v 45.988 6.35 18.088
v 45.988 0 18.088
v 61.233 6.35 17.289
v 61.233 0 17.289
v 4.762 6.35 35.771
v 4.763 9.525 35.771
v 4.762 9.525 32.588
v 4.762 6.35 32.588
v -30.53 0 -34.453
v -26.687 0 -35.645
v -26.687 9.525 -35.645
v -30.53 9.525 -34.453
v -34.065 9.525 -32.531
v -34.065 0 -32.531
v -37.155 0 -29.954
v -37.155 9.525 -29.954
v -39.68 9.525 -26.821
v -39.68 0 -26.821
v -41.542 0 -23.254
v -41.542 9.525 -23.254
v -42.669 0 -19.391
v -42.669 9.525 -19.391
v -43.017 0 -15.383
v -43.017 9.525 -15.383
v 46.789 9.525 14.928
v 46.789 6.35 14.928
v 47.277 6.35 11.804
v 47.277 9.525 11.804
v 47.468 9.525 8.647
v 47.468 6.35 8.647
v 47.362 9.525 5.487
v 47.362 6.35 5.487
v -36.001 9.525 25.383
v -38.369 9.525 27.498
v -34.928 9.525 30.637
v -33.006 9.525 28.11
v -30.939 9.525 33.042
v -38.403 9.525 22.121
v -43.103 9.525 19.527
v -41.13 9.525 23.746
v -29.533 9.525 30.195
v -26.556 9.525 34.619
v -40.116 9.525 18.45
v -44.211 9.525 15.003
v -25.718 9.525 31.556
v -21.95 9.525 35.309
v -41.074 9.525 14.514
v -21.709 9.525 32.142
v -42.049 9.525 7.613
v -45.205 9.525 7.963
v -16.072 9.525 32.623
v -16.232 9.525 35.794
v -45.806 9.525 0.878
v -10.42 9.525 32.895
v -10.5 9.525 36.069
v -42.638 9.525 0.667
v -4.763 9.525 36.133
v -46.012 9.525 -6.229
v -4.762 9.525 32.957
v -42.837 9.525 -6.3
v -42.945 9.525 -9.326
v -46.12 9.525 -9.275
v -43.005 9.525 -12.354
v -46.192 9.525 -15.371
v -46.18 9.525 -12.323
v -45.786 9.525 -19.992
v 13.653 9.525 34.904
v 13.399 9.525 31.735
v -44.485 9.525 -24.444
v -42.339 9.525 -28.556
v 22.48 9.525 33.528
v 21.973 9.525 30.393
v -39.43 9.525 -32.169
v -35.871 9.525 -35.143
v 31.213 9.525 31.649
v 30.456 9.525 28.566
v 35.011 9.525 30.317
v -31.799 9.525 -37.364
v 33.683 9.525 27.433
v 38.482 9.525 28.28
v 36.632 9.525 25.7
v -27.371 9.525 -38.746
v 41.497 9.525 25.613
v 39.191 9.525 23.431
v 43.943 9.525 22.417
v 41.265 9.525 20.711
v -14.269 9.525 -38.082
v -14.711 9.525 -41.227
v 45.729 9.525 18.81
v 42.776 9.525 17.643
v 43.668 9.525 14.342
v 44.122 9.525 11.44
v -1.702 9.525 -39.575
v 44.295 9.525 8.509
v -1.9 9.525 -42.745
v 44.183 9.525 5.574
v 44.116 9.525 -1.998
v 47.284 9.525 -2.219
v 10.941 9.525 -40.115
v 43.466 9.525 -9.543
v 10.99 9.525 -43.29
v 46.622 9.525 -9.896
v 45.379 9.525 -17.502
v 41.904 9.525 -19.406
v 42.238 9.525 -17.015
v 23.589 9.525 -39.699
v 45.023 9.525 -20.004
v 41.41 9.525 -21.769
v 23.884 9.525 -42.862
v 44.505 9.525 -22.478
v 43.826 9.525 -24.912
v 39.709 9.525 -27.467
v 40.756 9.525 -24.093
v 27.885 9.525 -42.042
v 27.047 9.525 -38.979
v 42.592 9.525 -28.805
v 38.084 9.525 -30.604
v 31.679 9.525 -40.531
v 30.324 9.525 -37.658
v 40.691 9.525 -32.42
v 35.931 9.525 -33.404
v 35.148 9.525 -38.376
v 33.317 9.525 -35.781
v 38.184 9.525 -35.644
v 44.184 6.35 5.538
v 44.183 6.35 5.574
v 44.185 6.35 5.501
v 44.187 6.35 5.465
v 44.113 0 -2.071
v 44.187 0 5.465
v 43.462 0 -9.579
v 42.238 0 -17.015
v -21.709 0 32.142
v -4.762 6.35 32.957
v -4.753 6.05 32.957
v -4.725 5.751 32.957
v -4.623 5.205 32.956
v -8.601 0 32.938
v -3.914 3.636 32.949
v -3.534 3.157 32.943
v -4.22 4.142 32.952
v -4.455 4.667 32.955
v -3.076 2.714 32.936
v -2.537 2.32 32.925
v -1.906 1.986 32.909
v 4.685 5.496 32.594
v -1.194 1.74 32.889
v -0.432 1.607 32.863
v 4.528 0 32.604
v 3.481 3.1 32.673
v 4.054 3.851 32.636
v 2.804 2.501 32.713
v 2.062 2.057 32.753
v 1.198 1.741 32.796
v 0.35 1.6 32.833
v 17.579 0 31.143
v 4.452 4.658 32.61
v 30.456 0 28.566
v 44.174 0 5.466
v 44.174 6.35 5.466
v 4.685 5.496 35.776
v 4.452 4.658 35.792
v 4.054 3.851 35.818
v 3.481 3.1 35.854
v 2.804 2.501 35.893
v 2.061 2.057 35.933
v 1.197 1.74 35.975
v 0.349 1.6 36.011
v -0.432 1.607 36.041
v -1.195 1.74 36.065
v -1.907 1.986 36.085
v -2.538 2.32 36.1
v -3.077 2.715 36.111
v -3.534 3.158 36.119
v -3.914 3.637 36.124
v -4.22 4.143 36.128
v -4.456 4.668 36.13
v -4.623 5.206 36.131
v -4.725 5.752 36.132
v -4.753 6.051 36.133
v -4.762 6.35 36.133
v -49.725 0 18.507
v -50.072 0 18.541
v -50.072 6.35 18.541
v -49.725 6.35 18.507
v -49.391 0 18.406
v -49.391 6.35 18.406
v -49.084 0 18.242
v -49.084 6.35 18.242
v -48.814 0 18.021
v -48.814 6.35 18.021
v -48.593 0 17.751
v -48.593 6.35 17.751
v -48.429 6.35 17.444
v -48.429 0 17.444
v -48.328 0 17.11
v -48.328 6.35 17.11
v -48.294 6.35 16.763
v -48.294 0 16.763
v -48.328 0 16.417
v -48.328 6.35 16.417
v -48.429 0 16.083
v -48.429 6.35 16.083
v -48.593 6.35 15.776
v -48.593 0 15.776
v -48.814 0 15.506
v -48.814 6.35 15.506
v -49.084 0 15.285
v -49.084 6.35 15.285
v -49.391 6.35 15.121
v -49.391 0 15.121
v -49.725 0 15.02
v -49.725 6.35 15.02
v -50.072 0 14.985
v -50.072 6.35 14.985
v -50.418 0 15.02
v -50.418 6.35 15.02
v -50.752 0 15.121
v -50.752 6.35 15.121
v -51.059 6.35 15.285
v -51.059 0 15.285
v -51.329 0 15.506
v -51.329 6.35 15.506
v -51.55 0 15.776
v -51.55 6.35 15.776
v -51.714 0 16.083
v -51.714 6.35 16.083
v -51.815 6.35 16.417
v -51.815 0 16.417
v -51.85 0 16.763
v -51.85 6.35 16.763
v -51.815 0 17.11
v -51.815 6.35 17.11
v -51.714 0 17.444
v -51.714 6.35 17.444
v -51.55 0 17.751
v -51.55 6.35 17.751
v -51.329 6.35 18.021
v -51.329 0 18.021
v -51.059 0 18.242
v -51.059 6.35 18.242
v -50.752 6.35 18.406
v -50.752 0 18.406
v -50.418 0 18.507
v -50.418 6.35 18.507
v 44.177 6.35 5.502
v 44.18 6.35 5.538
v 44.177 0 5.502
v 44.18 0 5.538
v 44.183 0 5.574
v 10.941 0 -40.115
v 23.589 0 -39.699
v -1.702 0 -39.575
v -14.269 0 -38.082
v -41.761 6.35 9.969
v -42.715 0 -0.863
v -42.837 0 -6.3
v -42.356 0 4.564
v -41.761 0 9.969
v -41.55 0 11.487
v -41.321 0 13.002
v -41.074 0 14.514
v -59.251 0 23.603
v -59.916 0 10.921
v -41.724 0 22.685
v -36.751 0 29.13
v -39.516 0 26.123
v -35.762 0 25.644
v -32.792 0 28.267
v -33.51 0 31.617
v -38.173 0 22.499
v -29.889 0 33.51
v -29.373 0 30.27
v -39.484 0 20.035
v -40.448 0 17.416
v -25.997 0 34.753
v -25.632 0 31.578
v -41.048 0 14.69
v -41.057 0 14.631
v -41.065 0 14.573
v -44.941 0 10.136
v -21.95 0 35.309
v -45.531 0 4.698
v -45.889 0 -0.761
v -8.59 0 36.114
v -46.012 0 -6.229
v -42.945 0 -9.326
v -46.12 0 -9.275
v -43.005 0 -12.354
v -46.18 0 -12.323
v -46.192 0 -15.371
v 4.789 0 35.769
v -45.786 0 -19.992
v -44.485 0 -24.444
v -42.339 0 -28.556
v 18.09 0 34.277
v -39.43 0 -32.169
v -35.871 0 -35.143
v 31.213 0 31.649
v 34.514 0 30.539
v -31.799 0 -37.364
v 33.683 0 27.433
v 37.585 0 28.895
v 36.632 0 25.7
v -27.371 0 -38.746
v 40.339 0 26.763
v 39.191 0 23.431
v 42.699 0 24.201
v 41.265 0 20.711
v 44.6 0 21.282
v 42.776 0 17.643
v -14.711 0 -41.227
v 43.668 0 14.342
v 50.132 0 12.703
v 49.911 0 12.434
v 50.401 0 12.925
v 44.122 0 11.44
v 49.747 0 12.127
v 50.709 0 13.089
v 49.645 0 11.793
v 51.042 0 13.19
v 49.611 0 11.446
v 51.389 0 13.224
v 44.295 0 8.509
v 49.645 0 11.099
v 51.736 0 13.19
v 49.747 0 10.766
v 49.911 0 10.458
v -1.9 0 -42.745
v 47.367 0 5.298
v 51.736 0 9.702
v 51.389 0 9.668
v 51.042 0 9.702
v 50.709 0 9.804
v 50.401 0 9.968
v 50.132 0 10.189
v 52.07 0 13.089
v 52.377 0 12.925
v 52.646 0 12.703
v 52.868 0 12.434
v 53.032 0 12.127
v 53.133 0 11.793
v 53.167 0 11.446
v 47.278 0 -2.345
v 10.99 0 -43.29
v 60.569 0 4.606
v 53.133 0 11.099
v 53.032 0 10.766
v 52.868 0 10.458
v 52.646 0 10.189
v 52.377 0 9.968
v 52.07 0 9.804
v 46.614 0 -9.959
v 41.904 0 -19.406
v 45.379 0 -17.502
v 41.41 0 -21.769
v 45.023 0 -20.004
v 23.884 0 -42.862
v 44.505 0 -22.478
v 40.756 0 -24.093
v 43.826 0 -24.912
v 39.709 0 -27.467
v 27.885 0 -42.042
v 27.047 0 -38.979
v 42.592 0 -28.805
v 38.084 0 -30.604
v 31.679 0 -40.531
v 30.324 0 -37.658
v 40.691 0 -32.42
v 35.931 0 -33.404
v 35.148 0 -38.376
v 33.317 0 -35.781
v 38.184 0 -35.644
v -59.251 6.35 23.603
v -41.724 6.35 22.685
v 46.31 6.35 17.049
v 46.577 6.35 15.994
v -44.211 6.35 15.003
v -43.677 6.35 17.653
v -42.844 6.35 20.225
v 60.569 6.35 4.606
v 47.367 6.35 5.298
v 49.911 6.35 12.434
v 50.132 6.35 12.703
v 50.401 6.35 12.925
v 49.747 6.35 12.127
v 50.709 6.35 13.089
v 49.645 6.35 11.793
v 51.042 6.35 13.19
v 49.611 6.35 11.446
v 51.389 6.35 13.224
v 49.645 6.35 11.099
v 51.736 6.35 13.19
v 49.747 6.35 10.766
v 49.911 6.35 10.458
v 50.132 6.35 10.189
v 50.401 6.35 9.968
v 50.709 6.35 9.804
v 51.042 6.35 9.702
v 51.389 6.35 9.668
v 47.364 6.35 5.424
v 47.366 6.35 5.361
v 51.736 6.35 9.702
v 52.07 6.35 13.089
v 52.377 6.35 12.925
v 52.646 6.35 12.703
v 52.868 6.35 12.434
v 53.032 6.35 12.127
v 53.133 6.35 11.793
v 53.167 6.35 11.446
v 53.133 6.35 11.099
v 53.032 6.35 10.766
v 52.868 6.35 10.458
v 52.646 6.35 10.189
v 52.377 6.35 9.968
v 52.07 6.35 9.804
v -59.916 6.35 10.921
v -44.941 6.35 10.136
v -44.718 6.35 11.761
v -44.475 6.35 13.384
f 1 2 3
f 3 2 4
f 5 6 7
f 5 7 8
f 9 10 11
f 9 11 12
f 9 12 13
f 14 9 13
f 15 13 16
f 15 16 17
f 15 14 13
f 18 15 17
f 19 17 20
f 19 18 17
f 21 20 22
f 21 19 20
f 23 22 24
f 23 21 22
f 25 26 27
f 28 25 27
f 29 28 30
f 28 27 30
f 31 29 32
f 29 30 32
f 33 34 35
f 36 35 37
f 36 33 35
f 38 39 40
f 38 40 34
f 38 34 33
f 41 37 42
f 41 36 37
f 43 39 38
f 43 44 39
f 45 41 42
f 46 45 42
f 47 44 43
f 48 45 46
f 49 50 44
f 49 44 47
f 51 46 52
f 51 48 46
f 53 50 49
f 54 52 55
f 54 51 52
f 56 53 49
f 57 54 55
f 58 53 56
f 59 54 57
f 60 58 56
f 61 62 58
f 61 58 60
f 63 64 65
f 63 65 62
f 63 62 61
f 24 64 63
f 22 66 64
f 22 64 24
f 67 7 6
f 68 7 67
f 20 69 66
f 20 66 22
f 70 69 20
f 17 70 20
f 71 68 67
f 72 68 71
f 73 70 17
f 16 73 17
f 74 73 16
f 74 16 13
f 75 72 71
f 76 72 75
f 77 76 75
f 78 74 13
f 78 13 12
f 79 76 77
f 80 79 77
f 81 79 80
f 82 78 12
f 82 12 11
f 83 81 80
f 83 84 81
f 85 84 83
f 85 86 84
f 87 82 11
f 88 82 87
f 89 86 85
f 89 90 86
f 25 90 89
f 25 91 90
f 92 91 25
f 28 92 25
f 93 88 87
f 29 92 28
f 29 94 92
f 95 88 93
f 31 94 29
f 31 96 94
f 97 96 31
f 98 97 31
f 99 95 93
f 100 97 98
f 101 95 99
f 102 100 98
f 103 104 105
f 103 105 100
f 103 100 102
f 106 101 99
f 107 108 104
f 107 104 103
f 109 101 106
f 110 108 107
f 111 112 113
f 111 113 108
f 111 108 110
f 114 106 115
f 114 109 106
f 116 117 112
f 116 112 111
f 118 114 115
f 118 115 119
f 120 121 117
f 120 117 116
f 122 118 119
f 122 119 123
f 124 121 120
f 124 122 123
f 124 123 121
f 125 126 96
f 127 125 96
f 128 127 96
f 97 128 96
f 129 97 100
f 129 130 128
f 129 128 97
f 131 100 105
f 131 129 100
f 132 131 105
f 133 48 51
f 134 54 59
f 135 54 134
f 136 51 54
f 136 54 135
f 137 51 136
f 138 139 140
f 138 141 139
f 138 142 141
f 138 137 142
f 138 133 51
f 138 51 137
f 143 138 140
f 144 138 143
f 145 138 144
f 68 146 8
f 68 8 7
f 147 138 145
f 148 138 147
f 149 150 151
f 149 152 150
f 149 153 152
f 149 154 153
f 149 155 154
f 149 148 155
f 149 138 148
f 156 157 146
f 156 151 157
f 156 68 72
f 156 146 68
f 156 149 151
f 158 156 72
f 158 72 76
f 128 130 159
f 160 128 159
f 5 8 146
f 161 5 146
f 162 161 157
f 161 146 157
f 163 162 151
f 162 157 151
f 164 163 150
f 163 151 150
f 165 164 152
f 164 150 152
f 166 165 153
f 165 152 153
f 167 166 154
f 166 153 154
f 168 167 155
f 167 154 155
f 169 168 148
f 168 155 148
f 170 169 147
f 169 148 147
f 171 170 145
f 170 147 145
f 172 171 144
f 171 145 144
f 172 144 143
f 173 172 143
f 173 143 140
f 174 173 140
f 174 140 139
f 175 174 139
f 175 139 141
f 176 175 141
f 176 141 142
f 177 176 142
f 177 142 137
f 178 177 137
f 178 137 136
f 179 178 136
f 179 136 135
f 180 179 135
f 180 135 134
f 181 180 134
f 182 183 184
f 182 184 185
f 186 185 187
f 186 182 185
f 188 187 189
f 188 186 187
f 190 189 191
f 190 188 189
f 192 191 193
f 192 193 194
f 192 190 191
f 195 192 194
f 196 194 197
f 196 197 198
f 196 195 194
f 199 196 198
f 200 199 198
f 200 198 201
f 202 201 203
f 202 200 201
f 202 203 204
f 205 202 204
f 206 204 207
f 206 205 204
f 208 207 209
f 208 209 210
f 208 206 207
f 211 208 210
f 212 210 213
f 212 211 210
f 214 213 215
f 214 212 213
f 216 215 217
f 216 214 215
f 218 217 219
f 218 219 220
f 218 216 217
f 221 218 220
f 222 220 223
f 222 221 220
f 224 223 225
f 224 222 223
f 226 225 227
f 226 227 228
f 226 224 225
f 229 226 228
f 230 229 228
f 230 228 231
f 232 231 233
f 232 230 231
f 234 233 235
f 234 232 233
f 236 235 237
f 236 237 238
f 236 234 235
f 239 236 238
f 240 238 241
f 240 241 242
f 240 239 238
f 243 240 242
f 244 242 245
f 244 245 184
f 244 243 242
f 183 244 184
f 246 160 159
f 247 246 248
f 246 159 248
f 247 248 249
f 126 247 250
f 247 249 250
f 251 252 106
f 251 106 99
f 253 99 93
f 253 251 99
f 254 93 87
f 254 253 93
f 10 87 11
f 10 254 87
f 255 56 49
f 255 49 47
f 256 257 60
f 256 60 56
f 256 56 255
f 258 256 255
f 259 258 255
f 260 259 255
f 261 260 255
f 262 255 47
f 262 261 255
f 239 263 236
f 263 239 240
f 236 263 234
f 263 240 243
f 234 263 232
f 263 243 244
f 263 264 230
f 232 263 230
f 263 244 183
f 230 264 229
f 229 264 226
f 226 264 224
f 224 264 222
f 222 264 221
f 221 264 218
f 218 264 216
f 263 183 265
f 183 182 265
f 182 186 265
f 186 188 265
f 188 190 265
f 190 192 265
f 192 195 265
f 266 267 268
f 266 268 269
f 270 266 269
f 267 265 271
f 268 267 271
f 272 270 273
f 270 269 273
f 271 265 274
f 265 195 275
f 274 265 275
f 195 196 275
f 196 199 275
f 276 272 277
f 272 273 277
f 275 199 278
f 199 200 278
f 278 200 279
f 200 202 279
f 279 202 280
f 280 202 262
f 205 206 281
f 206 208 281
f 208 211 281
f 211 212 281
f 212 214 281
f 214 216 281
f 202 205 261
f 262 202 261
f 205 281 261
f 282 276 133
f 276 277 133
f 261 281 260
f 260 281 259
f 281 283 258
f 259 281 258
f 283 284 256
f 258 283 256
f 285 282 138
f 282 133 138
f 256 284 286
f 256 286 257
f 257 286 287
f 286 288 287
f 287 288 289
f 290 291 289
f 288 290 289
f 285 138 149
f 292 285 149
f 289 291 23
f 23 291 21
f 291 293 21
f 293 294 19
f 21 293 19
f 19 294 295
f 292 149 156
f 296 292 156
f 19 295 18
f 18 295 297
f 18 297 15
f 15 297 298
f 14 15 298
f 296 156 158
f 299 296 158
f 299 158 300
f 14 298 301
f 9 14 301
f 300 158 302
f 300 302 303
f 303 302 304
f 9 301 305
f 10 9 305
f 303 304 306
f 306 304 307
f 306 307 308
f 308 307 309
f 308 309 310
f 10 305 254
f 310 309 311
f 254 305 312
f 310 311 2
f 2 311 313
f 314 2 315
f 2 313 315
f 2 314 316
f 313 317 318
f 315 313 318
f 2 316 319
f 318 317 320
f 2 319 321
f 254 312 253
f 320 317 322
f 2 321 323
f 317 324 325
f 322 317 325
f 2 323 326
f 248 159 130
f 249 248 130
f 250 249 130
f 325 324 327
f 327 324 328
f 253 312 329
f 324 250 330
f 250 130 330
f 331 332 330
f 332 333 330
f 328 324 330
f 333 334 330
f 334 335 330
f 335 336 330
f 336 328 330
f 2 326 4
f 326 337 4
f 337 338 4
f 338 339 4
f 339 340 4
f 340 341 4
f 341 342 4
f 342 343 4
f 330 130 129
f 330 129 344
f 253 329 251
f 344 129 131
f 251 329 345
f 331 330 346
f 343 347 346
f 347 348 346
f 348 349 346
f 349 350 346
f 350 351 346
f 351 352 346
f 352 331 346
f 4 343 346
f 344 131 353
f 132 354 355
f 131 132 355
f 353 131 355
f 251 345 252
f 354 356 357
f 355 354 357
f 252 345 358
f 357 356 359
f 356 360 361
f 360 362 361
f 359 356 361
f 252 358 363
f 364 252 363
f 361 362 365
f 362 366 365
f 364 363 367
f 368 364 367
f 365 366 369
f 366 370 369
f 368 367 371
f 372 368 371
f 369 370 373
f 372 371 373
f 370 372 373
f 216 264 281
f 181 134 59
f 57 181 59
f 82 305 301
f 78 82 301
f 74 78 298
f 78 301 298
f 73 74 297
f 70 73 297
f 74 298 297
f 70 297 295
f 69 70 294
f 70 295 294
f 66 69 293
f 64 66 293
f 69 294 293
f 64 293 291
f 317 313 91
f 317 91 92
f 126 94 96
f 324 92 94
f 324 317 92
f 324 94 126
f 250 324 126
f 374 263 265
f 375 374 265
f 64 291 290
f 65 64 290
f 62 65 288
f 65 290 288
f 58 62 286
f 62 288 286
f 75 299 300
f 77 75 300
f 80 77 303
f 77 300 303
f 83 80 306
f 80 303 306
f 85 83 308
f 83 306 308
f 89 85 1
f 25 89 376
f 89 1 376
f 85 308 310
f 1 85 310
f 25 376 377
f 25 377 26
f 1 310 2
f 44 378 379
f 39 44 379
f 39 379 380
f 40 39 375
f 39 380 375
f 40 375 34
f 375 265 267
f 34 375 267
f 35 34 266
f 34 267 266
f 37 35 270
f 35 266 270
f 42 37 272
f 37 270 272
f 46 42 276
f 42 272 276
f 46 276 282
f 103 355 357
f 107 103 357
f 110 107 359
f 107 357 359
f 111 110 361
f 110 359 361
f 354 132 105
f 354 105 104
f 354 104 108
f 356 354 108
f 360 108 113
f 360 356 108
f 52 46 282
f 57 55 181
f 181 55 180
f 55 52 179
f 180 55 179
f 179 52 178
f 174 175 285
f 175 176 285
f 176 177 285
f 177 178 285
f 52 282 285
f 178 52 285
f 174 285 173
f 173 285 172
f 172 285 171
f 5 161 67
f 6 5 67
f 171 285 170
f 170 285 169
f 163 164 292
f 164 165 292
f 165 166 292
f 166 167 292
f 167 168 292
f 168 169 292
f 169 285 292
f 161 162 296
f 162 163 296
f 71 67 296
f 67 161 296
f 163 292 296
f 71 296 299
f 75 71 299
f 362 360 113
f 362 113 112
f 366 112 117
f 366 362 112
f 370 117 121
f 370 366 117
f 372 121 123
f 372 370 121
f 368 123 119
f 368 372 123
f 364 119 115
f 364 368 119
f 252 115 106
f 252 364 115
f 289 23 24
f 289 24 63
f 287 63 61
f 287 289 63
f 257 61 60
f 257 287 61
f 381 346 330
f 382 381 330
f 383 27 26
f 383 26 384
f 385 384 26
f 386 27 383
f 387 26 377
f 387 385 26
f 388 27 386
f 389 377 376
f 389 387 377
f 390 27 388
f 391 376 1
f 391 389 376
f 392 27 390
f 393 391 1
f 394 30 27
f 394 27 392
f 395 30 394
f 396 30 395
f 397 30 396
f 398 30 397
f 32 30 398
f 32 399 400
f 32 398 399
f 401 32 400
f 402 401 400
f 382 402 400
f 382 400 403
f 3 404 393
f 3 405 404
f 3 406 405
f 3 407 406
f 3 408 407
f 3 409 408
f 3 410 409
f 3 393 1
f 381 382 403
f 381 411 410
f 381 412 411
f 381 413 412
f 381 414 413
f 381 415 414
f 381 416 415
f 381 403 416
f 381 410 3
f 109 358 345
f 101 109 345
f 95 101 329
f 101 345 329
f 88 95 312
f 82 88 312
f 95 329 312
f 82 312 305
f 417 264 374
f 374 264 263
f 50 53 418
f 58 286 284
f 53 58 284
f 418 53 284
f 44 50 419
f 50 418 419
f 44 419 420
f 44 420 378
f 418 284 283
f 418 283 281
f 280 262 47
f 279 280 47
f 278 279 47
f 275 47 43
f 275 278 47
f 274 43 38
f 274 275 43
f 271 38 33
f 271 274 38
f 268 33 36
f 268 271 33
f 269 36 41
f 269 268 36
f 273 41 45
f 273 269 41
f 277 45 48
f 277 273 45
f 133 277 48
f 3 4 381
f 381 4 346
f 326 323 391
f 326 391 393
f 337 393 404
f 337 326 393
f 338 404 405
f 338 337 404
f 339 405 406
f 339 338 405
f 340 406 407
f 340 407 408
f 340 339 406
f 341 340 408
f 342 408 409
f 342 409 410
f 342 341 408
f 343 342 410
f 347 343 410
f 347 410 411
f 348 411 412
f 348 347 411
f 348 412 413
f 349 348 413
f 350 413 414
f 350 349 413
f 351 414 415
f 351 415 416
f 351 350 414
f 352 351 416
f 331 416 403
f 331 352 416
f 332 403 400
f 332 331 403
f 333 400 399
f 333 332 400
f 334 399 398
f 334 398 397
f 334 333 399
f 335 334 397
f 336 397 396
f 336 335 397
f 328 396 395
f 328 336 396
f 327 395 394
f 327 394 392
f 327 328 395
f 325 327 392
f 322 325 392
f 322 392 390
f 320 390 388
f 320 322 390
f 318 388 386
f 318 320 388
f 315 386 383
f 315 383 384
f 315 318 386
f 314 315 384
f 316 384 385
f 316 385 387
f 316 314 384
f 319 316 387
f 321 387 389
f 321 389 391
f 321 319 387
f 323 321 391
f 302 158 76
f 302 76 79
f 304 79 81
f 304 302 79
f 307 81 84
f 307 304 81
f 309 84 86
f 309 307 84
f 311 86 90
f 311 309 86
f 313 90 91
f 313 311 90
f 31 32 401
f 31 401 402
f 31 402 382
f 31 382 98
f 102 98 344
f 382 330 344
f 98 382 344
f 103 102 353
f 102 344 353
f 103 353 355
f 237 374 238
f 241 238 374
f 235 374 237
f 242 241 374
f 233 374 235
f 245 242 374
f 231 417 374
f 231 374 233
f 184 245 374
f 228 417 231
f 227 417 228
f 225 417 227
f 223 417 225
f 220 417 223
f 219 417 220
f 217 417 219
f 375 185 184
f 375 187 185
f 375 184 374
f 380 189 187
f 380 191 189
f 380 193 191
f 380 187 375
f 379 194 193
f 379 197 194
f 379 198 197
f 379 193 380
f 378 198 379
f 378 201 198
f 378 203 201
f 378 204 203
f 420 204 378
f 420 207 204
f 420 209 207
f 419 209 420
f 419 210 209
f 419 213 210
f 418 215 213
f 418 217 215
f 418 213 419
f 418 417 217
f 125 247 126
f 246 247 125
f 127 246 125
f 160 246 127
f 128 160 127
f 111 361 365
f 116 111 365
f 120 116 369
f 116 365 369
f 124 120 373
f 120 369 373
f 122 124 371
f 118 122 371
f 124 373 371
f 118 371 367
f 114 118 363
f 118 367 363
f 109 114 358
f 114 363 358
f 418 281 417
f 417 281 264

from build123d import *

# Parameters (mm, degrees)
BOSS_EXTRUDE1_DEPTH = 9.525
SKETCH3_R           = 1.778
BOSS_EXTRUDE2_DEPTH = 6.35
CUT_EXTRUDE1_DEPTH  = 62.992


with BuildPart() as part:
    # Sketch2 → Boss-Extrude1 (new body)
    with BuildSketch(Plane(origin=(0, 0, 0), x_dir=(1, 0, 0), z_dir=(0, 1, 0))):
        with BuildLine():
            ThreePointArc((-27.371275132, 38.745818095), (-40.973617499, 30.433742494), (-46.191603644, 15.370975839))
            ThreePointArc((-46.191603644, 15.370975839), (-46.156170212, 10.799100226), (-46.01239655, 6.229348451))
            ThreePointArc((-46.01239655, 6.229348451), (-45.554867394, -4.424369785), (-44.211253726, -15.00292108))
            ThreePointArc((-44.211253726, -15.00292108), (-36.72609395, -29.152486681), (-21.949825784, -35.308761743))
            ThreePointArc((-21.949825784, -35.308761743), (4.789142288, -35.769006094), (31.212812312, -31.649066671))
            ThreePointArc((31.212812312, -31.649066671), (41.496738573, -25.613366213), (46.788564963, -14.927609673))
            ThreePointArc((46.788564963, -14.927609673), (47.409631974, -10.227797309), (47.362149343, -5.487364219))
            ThreePointArc((47.362149343, -5.487364219), (47.025821725, 6.063769752), (45.378811544, 17.501827706))
            ThreePointArc((45.378811544, 17.501827706), (44.784036993, 21.245111147), (43.826445822, 24.912391724))
            ThreePointArc((43.826445822, 24.912391724), (36.726457071, 37.077263766), (23.883695238, 42.861502743))
            ThreePointArc((23.883695238, 42.861502743), (-1.899636761, 42.744509754), (-27.371275132, 38.745818095))
        make_face()
        with BuildLine():
            ThreePointArc((-26.686729853, 35.645166459), (-38.494719431, 28.449859817), (-43.016527849, 15.382560778))
            ThreePointArc((-43.016527849, 15.382560778), (-42.981363707, 10.840148441), (-42.837461763, 6.299879882))
            ThreePointArc((-42.837461763, 6.299879882), (-42.392238342, -4.14410464), (-41.073809227, -14.514098915))
            ThreePointArc((-41.073809227, -14.514098915), (-34.571127727, -26.820697593), (-21.709378759, -32.141660966))
            ThreePointArc((-21.709378759, -32.141660966), (4.527721192, -32.604481914), (30.456209617, -28.565533412))
            ThreePointArc((30.456209617, -28.565533412), (39.190718322, -23.430787451), (43.667641206, -14.341539963))
            ThreePointArc((43.667641206, -14.341539963), (44.243978017, -9.976676032), (44.183339256, -5.574344354))
            ThreePointArc((44.183339256, -5.574344354), (43.863792824, 5.776703787), (42.237767725, 17.015228877))
            ThreePointArc((42.237767725, 17.015228877), (41.676987361, 20.591755151), (40.755667539, 24.092781371))
            ThreePointArc((40.755667539, 24.092781371), (34.67633853, 34.650507535), (23.588863748, 39.699440682))
            ThreePointArc((23.588863748, 39.699440682), (-1.702378082, 39.575120085), (-26.686729853, 35.645166459))
        make_face(mode=Mode.SUBTRACT)
    extrude(amount=BOSS_EXTRUDE1_DEPTH)

    # Sketch3 → Boss-Extrude2 (add)
    # profile 1 of 2: a face of its own
    with BuildSketch(Plane(origin=(0, 0, 0), x_dir=(1, 0, 0), z_dir=(0, 1, 0))):
        with BuildLine():
            ThreePointArc((43.667641206, -14.341539963), (43.210882804, -16.338608318), (42.526004307, -18.269372853))
            Line((42.526004307, -18.269372853), (61.233464192, -17.288956425))
            Line((61.233464192, -17.288956425), (60.568797548, -4.606361333))
            Line((60.568797548, -4.606361333), (44.173733451, -5.465590234))
            ThreePointArc((44.173733451, -5.465590234), (44.247134499, -9.922178586), (43.667641206, -14.341539963))
        make_face()
        with Locations(Location((51.389184551, -11.446158862, 0), (0, 0, 270))):
            Circle(SKETCH3_R, mode=Mode.SUBTRACT)
    # profile 2 of 2: a face of its own
    with BuildSketch(Plane(origin=(0, 0, 0), x_dir=(1, 0, 0), z_dir=(0, 1, 0))):
        with BuildLine():
            Line((-59.91585582, -10.920694454), (-59.251189176, -23.603289546))
            Line((-59.251189176, -23.603289546), (-38.172742485, -22.498614964))
            ThreePointArc((-38.172742485, -22.498614964), (-40.010730071, -18.741588452), (-41.048292167, -14.689809648))
            ThreePointArc((-41.048292167, -14.689809648), (-41.491708705, -12.342684149), (-41.760500894, -9.96921262))
            Line((-41.760500894, -9.96921262), (-59.91585582, -10.920694454))
        make_face()
        with Locations(Location((-50.07157618, -16.763492017, 0), (0, 0, 270))):
            Circle(SKETCH3_R, mode=Mode.SUBTRACT)
    extrude(amount=BOSS_EXTRUDE2_DEPTH)

    # Sketch4 → Cut-Extrude1 (cut)
    with BuildSketch(Plane.XY):
        with BuildLine():
            Line((-4.7625, 9.525), (4.7625, 9.525))
            Line((4.7625, 9.525), (4.7625, 6.35))
            ThreePointArc((4.7625, 6.35), (0, 1.5875), (-4.7625, 6.35))
            Line((-4.7625, 6.35), (-4.7625, 9.525))
        make_face()
    extrude(amount=CUT_EXTRUDE1_DEPTH, mode=Mode.SUBTRACT)


solid = part.part
